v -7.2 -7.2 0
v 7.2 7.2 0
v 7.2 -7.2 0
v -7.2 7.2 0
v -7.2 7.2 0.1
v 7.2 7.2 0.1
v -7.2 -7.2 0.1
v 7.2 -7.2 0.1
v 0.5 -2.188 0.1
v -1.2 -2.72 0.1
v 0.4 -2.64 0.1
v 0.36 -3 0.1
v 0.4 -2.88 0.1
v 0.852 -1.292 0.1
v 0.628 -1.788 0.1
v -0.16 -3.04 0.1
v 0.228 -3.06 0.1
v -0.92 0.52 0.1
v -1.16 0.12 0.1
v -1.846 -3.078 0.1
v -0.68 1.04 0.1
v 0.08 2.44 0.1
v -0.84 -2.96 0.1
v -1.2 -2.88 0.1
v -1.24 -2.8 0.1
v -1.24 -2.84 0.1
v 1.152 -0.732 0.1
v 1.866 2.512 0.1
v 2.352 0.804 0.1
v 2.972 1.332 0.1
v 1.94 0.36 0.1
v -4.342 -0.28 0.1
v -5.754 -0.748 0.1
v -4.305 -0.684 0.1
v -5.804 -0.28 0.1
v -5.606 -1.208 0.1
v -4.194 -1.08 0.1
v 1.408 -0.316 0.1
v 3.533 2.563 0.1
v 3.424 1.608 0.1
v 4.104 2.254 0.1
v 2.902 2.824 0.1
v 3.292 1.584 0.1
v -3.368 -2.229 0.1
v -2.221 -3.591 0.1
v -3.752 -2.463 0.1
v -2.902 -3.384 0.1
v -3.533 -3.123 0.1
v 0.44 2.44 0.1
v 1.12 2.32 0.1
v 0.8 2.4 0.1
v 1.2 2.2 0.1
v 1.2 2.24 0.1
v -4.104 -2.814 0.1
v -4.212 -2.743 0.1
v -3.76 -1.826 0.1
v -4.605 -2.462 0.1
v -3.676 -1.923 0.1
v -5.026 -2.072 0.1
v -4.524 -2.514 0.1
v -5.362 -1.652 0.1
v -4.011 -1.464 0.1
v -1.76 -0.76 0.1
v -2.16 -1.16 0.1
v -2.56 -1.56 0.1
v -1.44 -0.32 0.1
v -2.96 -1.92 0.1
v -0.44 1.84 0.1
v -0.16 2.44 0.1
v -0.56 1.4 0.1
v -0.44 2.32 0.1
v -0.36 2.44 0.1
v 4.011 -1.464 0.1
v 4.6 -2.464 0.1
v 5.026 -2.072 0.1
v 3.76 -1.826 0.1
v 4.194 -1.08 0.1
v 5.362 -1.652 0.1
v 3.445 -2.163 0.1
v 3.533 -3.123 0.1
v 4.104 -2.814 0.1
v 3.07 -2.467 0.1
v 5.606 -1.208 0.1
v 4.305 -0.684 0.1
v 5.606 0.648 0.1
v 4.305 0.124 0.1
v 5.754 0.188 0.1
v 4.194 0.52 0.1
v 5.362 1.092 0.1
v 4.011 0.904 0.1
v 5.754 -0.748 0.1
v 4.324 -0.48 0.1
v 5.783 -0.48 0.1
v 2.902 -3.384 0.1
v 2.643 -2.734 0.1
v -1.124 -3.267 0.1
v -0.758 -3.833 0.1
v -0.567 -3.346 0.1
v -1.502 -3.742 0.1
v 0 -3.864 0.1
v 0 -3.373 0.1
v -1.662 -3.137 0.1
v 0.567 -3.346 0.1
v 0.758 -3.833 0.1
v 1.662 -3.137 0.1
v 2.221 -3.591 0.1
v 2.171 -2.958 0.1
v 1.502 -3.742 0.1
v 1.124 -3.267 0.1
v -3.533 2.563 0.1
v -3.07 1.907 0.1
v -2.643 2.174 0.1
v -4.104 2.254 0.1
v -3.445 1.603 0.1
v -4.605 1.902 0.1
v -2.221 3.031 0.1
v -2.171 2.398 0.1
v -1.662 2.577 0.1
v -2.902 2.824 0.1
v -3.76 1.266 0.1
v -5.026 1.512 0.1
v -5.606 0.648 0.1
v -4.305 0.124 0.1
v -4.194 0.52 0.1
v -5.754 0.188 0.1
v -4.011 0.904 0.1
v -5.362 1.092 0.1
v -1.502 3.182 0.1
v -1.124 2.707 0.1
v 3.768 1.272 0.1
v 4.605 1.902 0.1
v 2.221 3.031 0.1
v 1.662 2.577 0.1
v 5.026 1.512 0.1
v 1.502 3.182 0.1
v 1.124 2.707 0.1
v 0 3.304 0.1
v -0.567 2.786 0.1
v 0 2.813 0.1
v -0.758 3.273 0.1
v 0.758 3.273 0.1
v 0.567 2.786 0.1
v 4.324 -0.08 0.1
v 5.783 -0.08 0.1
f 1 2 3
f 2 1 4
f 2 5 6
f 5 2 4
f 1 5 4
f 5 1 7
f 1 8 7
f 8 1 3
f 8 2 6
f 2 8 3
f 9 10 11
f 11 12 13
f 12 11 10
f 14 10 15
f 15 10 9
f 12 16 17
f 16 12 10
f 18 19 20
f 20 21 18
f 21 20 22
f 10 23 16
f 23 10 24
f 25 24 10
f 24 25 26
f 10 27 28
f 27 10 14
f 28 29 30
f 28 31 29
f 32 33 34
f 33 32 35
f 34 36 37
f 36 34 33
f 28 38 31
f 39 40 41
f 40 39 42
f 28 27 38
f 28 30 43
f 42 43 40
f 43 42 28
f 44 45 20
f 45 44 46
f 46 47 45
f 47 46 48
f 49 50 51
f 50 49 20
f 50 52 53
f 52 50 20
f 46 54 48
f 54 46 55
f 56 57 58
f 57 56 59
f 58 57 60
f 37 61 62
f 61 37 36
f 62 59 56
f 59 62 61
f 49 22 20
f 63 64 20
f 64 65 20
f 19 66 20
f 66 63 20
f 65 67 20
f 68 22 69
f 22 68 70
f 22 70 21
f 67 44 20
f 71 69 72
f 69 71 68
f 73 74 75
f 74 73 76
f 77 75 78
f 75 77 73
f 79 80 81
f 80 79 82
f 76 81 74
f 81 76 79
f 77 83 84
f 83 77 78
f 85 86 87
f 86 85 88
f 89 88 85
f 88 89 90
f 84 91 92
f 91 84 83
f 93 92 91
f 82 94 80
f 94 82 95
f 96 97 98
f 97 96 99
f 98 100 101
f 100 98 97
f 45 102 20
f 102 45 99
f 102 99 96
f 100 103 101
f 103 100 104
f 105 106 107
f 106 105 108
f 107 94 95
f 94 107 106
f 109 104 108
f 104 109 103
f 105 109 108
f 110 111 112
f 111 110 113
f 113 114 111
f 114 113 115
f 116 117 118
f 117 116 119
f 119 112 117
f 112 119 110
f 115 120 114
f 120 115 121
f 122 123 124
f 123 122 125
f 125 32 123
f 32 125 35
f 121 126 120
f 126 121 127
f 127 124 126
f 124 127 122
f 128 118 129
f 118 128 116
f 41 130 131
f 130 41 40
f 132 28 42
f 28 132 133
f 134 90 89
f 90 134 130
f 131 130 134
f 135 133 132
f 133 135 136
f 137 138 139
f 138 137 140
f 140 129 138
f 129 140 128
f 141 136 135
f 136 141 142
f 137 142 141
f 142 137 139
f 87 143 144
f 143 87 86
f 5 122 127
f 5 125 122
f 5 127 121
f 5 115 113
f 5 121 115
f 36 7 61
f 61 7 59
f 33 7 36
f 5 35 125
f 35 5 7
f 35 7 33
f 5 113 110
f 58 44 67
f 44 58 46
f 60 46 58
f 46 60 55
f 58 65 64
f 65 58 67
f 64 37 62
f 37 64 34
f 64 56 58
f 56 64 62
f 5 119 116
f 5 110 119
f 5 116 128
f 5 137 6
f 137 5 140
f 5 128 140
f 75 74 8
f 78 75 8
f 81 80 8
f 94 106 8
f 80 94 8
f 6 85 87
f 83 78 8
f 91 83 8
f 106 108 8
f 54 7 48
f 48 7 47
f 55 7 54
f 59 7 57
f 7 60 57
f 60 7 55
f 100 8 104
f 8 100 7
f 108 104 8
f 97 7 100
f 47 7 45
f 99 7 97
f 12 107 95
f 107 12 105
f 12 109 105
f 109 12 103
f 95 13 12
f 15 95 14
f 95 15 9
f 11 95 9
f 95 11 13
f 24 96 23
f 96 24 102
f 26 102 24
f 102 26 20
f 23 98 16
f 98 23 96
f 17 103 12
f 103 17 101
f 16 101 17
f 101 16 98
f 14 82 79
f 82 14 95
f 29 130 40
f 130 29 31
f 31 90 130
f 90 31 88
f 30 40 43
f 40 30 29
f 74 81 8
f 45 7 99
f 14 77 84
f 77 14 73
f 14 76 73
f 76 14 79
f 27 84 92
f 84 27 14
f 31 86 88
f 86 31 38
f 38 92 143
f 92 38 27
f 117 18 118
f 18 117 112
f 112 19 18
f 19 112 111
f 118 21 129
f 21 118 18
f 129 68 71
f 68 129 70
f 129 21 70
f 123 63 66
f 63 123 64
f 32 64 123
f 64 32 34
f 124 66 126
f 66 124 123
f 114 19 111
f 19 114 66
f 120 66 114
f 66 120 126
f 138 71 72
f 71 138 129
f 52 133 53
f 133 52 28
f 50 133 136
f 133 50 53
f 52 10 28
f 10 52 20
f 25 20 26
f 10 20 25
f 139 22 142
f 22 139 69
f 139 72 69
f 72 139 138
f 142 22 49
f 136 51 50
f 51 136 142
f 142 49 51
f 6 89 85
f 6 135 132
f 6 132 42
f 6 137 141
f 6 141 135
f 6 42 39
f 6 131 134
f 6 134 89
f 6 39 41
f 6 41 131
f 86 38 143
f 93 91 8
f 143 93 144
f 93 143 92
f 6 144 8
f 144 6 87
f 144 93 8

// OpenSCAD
// file: ../p/box5-12.scad
use <../lib.scad>
function ldraw_lib__box5_12() = [
// 0 Box with 5 Faces without Any Edges
// 0 Name: box5-12.dat
// 0 Author: Chris Dee [cwdee]
// 0 !LDRAW_ORG Primitive UPDATE 2009-02
// 0 !LICENSE Licensed under CC BY 4.0 : see CAreadme.txt
// 
// 0 BFC CERTIFY CCW
  [0,"BFC","CERTIFY"],
  [0,"BFC","CCW"],
// 
// 0 !HISTORY 2009-09-03 [PTadmin] Official Update 2009-02
// 
// 
// 4 16 1 1 1 1 1 -1 -1 1 -1 -1 1 1
  [4,16,1,1,1,1,1,-1,-1,1,-1,-1,1,1],
// 4 16 -1 0 1 1 0 1 1 1 1 -1 1 1
  [4,16,-1,0,1,1,0,1,1,1,1,-1,1,1],
// 4 16 -1 0 -1 -1 0 1 -1 1 1 -1 1 -1
  [4,16,-1,0,-1,-1,0,1,-1,1,1,-1,1,-1],
// 4 16 1 0 -1 -1 0 -1 -1 1 -1 1 1 -1
  [4,16,1,0,-1,-1,0,-1,-1,1,-1,1,1,-1],
// 4 16 1 0 1 1 0 -1 1 1 -1 1 1 1
  [4,16,1,0,1,1,0,-1,1,1,-1,1,1,1],
// 0
];
module ldraw_lib__box5_12(step=0, col=false, unit=2/5, alt=false, line=0.2, solid=!$preview)
    makepoly(ldraw_lib__box5_12(), step=step, col=col, unit=unit, alt=alt, line=line, solid=solid);
ldraw_lib__box5_12(line=0.2);
// main file
use <../lib.scad>
use <../p/box5-12.scad>
use <s/168315is01.scad>
use <s/168315is02.scad>
function ldraw_lib__168315i() = [
// 0 Sticker  1.8 x  1.8 with Yellow "LT" Logo on Black Background
// 0 Name: 168315i.dat
// 0 Author: Max Martin Richter [MMR1988]
// 0 !LDRAW_ORG Part UPDATE 2023-05
// 0 !LICENSE Licensed under CC BY 4.0 : see CAreadme.txt
// 
// 0 BFC CERTIFY CCW
  [0,"BFC","CERTIFY"],
  [0,"BFC","CCW"],
// 
// 0 !KEYWORDS set 8880, Supercar
// 
// 0 !HISTORY 2023-10-31 [OrionP] Official Update 2023-05
// 
// 
// 1 16 0 -0.25 0 18 0 0 0 0.25 0 0 0 18 box5-12.dat
  [1,16,0,-0.25,0,18,0,0,0,0.25,0,0,0,18, ldraw_lib__box5_12()],
// 
// 1 14 0 -0.25 0 1 0 0 0 1 0 0 0 1 s\168315is01.dat
  [1,14,0,-0.25,0,1,0,0,0,1,0,0,0,1, ldraw_lib__s__168315is01()],
// 1 0 0 -0.25 0 1 0 0 0 1 0 0 0 1 s\168315is02.dat
  [1,0,0,-0.25,0,1,0,0,0,1,0,0,0,1, ldraw_lib__s__168315is02()],
];
module ldraw_lib__168315i(step=0, col=false, unit=2/5, alt=false, line=0.2, solid=!$preview)
    makepoly(ldraw_lib__168315i(), step=step, col=col, unit=unit, alt=alt, line=line, solid=solid);
ldraw_lib__168315i(line=0.2);
